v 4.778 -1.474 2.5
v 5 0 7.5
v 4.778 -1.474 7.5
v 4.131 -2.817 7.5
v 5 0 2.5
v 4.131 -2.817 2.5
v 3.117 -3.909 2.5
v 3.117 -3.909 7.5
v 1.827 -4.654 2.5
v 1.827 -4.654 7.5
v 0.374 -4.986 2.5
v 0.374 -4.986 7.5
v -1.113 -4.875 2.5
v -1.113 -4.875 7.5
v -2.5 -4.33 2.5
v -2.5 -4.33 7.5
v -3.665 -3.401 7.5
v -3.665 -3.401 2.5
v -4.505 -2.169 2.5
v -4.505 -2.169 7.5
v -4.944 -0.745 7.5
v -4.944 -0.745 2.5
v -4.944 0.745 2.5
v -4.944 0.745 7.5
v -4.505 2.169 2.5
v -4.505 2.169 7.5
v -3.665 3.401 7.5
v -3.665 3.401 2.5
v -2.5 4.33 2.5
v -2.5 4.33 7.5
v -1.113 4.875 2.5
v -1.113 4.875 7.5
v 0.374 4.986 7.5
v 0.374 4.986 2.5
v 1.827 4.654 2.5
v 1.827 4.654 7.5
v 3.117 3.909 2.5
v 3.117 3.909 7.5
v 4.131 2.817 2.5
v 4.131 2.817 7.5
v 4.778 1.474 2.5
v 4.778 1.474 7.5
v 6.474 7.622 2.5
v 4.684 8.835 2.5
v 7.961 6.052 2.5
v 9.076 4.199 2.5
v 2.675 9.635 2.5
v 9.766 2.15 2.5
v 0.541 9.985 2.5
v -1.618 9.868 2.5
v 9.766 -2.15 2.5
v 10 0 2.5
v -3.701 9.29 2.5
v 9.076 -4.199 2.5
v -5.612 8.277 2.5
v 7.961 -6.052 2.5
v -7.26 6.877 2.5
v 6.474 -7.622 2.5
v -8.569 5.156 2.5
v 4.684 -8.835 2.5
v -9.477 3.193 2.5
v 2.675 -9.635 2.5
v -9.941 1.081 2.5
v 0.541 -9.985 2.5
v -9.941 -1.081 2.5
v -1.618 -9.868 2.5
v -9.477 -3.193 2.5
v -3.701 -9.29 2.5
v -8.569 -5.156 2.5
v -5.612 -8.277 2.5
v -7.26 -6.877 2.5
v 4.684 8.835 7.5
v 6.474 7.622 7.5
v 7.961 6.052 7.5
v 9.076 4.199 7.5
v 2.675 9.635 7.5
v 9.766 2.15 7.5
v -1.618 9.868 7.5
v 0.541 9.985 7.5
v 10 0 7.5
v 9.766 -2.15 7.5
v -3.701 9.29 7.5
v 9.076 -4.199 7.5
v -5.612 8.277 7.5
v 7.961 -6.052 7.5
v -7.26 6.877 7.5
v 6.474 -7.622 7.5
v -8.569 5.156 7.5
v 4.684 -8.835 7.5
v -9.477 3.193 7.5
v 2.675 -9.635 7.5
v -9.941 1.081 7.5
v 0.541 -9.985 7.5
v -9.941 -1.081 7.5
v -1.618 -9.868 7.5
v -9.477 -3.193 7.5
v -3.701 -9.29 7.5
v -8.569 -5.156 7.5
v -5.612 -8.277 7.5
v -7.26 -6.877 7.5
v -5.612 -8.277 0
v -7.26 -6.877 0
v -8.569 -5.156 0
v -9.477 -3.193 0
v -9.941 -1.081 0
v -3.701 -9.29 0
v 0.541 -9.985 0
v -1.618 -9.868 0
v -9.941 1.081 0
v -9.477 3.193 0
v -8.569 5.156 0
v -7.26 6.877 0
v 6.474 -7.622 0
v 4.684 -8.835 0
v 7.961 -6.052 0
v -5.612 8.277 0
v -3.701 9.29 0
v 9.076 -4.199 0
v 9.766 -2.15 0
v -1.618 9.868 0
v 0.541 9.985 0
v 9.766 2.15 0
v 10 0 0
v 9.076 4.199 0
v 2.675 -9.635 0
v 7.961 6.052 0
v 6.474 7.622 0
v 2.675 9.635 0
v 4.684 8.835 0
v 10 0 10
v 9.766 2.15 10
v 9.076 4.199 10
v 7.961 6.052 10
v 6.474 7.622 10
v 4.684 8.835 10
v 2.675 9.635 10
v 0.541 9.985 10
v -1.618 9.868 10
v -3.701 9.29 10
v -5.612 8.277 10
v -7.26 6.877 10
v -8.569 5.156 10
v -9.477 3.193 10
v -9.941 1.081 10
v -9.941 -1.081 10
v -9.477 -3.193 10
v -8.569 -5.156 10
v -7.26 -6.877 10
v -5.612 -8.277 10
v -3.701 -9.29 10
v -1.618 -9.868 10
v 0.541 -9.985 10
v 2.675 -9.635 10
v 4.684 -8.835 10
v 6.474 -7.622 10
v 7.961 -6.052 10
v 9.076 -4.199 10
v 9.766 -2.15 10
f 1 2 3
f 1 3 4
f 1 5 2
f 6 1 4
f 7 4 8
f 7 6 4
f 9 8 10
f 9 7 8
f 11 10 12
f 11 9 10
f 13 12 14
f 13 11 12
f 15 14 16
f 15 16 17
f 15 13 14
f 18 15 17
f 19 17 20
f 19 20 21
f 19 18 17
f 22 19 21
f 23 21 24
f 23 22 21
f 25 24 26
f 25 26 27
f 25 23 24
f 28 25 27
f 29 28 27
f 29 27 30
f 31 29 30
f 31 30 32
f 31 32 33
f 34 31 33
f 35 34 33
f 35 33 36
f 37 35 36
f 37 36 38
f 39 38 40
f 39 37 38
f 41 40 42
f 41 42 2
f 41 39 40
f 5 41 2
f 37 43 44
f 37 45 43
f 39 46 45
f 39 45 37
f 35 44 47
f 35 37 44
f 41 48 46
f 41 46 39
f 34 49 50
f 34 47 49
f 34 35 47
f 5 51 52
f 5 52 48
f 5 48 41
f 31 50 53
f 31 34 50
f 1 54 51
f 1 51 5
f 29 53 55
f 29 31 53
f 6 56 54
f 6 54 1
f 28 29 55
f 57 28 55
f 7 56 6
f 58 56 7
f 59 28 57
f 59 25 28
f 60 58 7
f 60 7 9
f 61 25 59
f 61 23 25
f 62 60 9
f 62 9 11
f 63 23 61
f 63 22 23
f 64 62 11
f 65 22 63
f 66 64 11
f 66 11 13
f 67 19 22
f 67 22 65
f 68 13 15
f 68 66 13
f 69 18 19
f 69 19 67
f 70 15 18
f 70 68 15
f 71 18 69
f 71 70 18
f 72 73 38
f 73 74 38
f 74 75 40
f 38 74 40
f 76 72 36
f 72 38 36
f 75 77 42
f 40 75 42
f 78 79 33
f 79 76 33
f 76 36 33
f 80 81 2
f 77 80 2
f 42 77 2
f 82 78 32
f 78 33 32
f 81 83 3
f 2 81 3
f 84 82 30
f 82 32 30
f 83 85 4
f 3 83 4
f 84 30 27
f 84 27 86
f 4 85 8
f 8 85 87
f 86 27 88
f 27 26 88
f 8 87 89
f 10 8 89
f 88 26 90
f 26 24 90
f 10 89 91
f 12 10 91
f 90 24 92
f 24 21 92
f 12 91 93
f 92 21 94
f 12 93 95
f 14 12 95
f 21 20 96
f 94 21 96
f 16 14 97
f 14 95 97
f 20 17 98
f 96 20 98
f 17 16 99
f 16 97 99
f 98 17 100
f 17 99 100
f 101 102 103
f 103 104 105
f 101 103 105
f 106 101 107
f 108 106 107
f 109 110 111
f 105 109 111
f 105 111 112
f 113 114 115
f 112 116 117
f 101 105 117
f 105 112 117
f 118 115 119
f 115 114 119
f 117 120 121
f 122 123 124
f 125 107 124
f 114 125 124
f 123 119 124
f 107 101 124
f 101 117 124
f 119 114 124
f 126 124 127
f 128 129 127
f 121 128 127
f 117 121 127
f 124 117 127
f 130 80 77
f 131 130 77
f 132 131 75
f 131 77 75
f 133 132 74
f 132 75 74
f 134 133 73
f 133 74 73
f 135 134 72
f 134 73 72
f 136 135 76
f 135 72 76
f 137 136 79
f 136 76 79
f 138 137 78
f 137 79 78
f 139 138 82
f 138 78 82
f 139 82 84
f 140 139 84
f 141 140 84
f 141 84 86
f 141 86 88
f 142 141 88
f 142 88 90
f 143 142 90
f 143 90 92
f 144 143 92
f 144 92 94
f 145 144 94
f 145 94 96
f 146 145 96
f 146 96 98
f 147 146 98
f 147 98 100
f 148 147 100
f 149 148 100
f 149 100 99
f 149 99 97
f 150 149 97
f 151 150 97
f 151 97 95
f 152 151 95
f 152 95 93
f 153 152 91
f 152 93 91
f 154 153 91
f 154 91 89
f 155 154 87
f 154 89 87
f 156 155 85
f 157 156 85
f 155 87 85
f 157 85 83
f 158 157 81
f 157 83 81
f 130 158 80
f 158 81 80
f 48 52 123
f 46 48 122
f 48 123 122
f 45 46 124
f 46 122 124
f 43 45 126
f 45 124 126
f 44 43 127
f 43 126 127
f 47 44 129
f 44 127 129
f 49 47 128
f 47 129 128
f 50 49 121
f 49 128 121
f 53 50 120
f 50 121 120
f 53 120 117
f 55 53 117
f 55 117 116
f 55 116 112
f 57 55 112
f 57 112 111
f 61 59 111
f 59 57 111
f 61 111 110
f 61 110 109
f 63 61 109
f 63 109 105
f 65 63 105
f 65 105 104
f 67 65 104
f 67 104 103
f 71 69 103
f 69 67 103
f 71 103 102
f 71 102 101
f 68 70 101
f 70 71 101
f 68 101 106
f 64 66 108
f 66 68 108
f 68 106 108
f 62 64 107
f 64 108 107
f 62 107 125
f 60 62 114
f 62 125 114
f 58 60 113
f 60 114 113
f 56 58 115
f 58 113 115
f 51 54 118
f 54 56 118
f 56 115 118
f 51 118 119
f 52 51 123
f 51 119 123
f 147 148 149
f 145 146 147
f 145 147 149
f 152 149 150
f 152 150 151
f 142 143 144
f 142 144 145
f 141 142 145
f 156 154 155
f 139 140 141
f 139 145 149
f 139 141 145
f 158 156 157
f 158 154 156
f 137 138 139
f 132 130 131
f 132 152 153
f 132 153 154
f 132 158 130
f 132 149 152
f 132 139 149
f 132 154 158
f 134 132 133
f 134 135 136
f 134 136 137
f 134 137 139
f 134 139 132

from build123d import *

# Parameters (mm, degrees)
SKETCH1_R           = 10
BOSS_EXTRUDE1_DEPTH = 10
SKETCH2_W           = 5
SKETCH2_H           = 5


with BuildPart() as part:
    # Sketch1 → Boss-Extrude1 (new body)
    with BuildSketch(Plane.XY):
        Circle(SKETCH1_R)
    extrude(amount=BOSS_EXTRUDE1_DEPTH)

    # Sketch2 → Cut-Revolve1 (revolve, cut)
    with BuildSketch(Plane(origin=(0, 0, 0), x_dir=(0, 0, -1), z_dir=(1, 0, 0)), mode=Mode.PRIVATE) as cut_revolve1_sk:
        with Locations((-5, 7.5)):
            Rectangle(SKETCH2_W, SKETCH2_H)
    revolve(cut_revolve1_sk.sketch.rotate(Axis((0, 0, 10), (0, 0, -1)), 90), axis=Axis((0, 0, 10), (0, 0, -1)), mode=Mode.SUBTRACT)


solid = part.part
